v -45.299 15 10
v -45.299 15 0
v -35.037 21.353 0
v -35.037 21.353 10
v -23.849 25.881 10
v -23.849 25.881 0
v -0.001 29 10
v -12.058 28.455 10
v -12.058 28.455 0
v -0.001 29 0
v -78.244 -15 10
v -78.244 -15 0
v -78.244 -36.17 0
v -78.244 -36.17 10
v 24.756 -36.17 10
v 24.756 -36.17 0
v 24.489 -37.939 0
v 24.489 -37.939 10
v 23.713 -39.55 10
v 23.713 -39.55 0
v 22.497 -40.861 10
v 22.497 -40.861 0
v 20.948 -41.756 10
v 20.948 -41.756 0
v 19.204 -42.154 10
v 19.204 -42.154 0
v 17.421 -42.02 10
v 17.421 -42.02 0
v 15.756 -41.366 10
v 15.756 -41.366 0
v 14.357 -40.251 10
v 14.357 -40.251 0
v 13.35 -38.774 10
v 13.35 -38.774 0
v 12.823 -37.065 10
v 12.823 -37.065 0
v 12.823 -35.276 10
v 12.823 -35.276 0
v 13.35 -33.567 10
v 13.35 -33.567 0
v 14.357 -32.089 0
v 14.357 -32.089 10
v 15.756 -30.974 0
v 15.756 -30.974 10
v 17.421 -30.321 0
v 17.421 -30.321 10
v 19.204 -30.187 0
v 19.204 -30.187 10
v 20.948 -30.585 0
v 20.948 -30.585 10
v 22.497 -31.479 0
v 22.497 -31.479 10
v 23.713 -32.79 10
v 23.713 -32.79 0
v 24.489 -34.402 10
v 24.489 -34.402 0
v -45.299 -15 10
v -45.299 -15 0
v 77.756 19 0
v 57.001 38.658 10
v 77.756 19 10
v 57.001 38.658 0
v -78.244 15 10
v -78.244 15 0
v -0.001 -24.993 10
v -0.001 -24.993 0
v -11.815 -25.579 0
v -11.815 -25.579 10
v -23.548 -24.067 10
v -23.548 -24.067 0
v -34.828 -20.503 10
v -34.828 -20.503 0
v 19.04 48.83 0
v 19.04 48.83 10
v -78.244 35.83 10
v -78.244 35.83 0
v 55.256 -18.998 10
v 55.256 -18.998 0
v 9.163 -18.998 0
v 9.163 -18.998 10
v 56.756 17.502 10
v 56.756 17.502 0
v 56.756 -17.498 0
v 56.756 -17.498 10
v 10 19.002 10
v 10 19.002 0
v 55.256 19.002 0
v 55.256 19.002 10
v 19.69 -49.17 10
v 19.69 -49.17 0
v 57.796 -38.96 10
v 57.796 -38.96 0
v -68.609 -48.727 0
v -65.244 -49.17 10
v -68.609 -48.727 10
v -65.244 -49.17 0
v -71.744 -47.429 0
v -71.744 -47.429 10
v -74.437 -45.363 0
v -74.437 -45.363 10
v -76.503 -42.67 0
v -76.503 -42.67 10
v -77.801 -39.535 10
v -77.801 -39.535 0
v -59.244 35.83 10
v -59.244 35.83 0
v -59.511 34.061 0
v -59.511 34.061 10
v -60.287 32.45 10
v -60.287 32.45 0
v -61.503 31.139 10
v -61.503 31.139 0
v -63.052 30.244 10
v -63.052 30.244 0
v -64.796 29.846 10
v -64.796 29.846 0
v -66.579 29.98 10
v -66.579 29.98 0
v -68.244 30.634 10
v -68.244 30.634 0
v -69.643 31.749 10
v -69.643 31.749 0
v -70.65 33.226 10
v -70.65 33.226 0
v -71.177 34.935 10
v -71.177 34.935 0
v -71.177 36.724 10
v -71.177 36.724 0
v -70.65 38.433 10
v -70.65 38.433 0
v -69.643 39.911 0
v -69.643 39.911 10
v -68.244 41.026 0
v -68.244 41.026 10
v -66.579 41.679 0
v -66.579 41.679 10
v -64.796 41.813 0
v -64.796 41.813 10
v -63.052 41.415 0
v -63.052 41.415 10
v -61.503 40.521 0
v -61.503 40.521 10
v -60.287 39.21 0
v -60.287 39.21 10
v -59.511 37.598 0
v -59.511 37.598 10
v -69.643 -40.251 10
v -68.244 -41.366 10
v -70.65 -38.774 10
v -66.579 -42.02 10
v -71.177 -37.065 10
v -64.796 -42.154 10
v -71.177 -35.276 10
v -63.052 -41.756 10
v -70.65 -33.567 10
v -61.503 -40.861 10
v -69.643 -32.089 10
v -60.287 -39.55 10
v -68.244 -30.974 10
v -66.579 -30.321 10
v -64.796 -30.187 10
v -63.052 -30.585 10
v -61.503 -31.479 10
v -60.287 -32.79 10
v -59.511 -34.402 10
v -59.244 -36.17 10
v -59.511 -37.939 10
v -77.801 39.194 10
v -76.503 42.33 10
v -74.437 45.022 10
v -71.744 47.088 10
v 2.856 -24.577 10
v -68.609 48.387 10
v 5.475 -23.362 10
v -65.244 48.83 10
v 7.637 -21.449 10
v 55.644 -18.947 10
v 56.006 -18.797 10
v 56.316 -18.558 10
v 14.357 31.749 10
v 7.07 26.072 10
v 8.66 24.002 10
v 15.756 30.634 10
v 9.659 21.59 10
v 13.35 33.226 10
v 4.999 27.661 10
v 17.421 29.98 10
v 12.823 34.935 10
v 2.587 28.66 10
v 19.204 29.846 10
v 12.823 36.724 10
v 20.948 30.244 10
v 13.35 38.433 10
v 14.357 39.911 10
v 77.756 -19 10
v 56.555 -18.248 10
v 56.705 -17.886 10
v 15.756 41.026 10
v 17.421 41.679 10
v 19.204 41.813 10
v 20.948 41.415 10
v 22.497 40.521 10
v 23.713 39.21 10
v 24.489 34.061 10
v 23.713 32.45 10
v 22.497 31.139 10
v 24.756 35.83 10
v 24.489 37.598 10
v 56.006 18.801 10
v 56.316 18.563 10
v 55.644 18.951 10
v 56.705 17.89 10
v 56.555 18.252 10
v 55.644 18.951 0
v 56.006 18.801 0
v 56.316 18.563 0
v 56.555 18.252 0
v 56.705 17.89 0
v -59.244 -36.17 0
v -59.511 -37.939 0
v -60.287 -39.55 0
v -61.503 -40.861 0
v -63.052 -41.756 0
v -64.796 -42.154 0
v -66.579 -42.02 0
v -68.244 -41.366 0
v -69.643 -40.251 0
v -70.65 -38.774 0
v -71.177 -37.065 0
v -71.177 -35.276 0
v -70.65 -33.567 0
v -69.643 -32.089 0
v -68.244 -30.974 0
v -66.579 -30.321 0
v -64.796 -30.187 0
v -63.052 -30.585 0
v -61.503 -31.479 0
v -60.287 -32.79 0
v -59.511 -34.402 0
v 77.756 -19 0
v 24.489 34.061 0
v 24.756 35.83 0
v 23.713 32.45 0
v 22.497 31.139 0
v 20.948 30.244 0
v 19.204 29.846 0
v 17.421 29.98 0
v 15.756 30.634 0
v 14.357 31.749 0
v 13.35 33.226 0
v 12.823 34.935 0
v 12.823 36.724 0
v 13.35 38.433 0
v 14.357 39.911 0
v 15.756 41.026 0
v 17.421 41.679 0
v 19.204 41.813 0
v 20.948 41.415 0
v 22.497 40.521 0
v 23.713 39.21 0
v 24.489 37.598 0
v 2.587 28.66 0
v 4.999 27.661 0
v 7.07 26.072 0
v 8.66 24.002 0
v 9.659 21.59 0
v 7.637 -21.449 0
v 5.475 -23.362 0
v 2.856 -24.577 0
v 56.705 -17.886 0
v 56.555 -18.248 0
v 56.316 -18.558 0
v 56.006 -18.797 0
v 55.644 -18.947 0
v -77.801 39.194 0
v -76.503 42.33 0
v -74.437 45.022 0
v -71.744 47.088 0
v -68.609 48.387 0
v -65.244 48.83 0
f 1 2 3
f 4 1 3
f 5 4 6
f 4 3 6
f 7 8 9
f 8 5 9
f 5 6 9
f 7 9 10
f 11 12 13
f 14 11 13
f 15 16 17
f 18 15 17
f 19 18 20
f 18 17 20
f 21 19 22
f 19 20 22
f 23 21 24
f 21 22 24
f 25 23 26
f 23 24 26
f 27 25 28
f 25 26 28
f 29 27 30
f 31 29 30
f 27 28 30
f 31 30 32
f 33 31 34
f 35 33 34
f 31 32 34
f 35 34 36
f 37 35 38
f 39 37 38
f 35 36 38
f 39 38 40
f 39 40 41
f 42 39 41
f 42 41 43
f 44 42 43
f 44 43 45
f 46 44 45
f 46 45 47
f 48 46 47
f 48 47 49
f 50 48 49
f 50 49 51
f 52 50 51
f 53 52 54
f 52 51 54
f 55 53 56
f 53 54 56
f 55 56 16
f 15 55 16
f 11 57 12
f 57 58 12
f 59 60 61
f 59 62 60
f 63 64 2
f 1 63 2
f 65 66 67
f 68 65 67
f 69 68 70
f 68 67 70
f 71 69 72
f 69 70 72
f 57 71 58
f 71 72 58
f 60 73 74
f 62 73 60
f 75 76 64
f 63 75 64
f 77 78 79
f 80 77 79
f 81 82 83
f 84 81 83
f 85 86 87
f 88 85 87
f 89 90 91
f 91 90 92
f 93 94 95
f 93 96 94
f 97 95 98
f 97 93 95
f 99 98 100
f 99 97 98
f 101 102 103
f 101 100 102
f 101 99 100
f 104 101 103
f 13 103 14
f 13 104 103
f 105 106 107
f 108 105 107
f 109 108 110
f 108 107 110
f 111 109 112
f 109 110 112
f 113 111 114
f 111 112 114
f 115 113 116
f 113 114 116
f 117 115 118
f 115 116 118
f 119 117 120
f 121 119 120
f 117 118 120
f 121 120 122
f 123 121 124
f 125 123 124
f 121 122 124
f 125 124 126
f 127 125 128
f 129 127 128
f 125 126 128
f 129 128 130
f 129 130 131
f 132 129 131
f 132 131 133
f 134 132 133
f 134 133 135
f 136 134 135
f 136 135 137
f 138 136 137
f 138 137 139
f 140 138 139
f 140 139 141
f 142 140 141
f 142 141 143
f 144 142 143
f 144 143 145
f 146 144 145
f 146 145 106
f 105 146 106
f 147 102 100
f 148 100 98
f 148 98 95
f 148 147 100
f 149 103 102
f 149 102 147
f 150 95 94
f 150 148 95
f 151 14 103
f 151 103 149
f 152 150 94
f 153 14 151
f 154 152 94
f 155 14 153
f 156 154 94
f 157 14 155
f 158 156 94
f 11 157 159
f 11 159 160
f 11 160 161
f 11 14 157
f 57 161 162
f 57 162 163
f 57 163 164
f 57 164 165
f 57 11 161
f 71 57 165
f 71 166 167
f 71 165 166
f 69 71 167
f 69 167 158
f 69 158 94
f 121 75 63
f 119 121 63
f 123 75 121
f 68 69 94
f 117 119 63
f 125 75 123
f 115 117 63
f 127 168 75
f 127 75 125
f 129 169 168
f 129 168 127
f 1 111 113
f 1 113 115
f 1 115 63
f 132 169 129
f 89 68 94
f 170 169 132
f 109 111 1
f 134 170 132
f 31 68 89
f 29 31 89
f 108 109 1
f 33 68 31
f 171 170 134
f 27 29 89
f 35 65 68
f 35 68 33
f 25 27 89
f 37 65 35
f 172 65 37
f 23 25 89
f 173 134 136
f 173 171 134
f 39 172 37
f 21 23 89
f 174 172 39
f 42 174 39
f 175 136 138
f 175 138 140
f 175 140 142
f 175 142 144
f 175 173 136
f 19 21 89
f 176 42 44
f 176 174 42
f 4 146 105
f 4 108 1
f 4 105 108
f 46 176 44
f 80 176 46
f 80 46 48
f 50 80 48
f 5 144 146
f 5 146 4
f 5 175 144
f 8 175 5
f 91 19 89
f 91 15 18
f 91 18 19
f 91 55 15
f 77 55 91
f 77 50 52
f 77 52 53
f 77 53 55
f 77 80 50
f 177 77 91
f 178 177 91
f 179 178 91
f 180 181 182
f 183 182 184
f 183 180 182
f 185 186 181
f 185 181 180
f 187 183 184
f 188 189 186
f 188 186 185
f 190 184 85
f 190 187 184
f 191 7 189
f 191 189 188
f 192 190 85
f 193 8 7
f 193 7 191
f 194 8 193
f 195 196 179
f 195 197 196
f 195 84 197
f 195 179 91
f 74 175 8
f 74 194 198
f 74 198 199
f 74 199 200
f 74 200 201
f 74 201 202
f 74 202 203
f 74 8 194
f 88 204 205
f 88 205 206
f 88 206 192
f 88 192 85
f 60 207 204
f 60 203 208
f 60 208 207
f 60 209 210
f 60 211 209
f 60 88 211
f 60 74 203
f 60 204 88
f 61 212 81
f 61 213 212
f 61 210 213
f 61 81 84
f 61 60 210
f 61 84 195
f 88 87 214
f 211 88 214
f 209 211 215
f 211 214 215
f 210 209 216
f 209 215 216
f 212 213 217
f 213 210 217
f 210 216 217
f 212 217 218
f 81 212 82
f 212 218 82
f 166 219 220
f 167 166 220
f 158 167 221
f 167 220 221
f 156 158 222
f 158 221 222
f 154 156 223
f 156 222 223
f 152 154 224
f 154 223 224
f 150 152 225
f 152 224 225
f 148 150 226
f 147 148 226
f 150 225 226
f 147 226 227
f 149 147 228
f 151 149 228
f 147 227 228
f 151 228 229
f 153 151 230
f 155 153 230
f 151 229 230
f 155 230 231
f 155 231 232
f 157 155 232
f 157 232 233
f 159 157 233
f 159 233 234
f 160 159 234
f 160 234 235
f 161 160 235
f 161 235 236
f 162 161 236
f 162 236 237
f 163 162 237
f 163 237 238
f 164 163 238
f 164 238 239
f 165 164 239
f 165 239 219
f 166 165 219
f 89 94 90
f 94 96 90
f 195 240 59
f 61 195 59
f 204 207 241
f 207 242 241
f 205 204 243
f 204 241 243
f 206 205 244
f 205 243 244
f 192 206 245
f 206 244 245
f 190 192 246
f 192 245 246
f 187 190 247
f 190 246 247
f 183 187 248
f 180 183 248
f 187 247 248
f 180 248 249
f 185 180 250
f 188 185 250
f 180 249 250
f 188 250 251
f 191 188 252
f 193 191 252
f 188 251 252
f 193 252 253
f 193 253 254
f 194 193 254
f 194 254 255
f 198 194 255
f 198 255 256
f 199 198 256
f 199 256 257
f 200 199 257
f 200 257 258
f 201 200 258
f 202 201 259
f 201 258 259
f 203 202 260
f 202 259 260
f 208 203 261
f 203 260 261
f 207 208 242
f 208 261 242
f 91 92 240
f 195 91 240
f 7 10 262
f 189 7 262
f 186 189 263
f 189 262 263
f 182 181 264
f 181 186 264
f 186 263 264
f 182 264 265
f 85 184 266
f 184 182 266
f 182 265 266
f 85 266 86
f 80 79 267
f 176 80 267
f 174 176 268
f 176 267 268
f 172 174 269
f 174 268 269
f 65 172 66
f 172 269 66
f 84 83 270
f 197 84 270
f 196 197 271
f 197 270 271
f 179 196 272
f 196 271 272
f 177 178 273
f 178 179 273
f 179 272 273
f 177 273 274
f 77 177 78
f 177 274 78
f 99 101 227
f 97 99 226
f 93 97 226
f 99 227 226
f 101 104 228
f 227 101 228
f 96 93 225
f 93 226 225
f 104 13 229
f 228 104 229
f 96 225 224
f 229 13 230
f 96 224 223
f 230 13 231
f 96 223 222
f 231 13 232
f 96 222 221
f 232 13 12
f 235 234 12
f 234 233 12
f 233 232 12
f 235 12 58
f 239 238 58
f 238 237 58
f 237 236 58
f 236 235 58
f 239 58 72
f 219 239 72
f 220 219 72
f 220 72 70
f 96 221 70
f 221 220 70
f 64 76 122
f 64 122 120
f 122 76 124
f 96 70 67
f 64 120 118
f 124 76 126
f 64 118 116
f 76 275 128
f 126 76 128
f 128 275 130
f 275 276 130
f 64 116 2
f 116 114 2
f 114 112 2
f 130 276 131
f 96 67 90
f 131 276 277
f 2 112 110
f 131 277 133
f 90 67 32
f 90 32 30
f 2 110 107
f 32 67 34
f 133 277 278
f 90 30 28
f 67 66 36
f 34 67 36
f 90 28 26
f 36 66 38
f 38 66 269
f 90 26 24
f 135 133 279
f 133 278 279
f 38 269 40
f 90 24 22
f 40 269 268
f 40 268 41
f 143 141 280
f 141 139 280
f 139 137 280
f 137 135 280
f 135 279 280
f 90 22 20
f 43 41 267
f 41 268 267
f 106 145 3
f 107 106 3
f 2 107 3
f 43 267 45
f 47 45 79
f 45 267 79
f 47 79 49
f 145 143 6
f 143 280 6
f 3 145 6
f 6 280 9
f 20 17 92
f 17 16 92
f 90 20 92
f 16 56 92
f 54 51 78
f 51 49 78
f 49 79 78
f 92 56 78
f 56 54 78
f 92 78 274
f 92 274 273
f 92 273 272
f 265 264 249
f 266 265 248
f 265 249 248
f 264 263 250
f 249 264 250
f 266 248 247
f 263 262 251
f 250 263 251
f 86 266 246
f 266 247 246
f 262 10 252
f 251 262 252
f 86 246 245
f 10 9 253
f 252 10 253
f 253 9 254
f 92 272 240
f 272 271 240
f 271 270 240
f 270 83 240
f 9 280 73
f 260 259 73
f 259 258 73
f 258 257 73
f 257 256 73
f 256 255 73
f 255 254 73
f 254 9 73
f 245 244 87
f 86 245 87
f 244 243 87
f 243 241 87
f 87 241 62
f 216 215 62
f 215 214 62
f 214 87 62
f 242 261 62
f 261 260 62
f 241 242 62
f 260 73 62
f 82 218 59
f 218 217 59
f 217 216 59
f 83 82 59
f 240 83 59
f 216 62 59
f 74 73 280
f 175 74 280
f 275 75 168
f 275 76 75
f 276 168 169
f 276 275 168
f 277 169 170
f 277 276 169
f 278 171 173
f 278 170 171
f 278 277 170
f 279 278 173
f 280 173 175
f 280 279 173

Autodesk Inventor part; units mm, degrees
ref_plane "YZ Plane" through (0, 0, 0) normal (1, 0, 0) x (0, 1, 0)
ref_plane "XZ Plane" through (0, 0, 0) normal (0, 1, 0) x (-1, 0, 0)
ref_plane "XY Plane" through (0, 0, 0) normal (0, 0, 1) x (1, 0, 0)
sketch "스케치1" plane through (0, 0, 0) normal (0, 0, 1) x (1, 0, 0)
  line L0 (-26.6915, 0) -> (30.6457, 0)
  line L1 (0.0002, 26.0752) -> (0.0002, -24.1528)
  line L2 (-65.2443, -49.1703) -> (0.0002, -49.1703)
  line L3 (0.0002, 48.8297) -> (-65.2443, 48.8297)
  line L4 (-78.2443, -49.1703) -> (77.7557, 48.8632) construction
  line L5 (78.0463, -48.7061) -> (-78.2443, 48.8297) construction
  line L6 (-65.2443, 35.8297) -> (18.7557, 35.8297)
  line L7 (18.7557, 35.8297) -> (18.7557, -36.1703)
  line L8 (18.7557, -36.1703) -> (-65.2443, -36.1703)
  line L9 (-65.2443, -36.1703) -> (-65.2443, 35.8297)
  line L10 (56.7557, 17.5022) -> (56.7557, -17.4978)
  circle A0 centre (18.7557, 35.8297) radius 6
  circle A1 centre (-65.2443, 35.8297) radius 6
  circle A2 centre (18.7557, -36.1703) radius 6
  circle A3 centre (-65.2443, -36.1703) radius 6
  arc A4 (-65.2443, 48.8297) -> (-78.2443, 35.8297) centre (-65.2443, 35.8297) ccw
  arc A5 (-78.2443, -36.1703) -> (-65.2443, -49.1703) centre (-65.2443, -36.1703) ccw
  line L11 (77.7557, -19) -> (77.7557, 19)
  line L12 (0.0002, 48.8297) -> (82.2012, 48.8297) construction
  line L13 (-78.2443, -49.1703) -> (82.2012, -49.1703) construction
  line L14 (0.0002, -49.1703) -> (19.6899, -49.1703)
  line L15 (0.0002, 48.8297) -> (19.0402, 48.8297)
  line L16 (19.6899, -49.1703) -> (57.7958, -38.9598)
  line L17 (19.6899, -49.1703) -> (59.1401, -49.1703) construction
  line L18 (19.0402, 48.8297) -> (59.7283, 48.8297) construction
  line L19 (57.7958, -38.9598) -> (87.4943, -38.9598) construction
  line L20 (19.0402, 48.8297) -> (61.8181, 48.8297) construction
  line L21 (19.0402, 48.8297) -> (57.0006, 38.6583)
  line L22 (19.0402, 48.8297) -> (58.3397, 48.8297) construction
  line L23 (57.0006, 38.6583) -> (77.7557, 19)
  line L24 (57.7958, -38.9598) -> (77.7557, -19)
  arc A6 (10.0002, 19.0022) -> (-0.0006, 29.0001) centre (0.0002, 19.0001) ccw
  line L25 (-78.2443, 35.8297) -> (-78.2443, 15.0001)
  line L26 (-78.2443, -15.0002) -> (-78.2443, -36.1703)
  line L27 (10.0002, 19.0022) -> (55.2557, 19.0022)
  line L28 (55.2557, -18.9978) -> (9.1632, -18.9978)
  line L29 (-45.2992, -15.0002) -> (-78.2443, -15.0002)
  arc A7 (-45.2992, -15.0002) -> (-0.0006, -24.9934) centre (-9.1955, 40.9912) ccw
  arc A8 (-0.0006, 29.0001) -> (-45.2992, 15.0001) centre (-2.8258, -42.143) ccw
  arc A9 (-0.0006, -24.9934) -> (9.1632, -18.9978) centre (0.0002, -14.9938) ccw
  arc A10 (56.7557, 17.5022) -> (55.2557, 19.0022) centre (55.2557, 17.5022) ccw
  arc A11 (55.2557, -18.9978) -> (56.7557, -17.4978) centre (55.2557, -17.4978) ccw
  line L30 (-78.2443, 15.0001) -> (-45.2992, 15.0001)
  point P0 (0, 0)
  dimension "d0" = 156
  dimension "d1" = 98
  dimension "d2" = 13
  dimension "d4" = 13
  dimension "d5" = 84
  dimension "d6" = 38
  dimension "d8" = 12
  dimension "d9" = 12
  dimension "d10" = 12
  dimension "d11" = 12
  dimension "d12" = 13
  dimension "d15" = 38
  dimension "d17" = 15
  dimension "d21" = 15
  dimension "d23" = 45
  dimension "d27" = 20
  dimension "d29" = 3
  dimension "d30" = 3
  dimension "d31" = 30.0004
extrude "돌출1" add sketch "스케치1" along normal blind 10 contours A5 L26 L29 L9 A3 L8 A2 L7 L28 A11 L10 A10 L27 A0 L6 A1 L30 L25 A4 L3 L15 L21 L23 L11 L24 L16 L14 L2 | L29 A7 A9 L28 L7 A2 L8 A3 L9 | L9 A1 L6 A0 L7 L27 A6 A8 L30
properties part number "스케치02"
